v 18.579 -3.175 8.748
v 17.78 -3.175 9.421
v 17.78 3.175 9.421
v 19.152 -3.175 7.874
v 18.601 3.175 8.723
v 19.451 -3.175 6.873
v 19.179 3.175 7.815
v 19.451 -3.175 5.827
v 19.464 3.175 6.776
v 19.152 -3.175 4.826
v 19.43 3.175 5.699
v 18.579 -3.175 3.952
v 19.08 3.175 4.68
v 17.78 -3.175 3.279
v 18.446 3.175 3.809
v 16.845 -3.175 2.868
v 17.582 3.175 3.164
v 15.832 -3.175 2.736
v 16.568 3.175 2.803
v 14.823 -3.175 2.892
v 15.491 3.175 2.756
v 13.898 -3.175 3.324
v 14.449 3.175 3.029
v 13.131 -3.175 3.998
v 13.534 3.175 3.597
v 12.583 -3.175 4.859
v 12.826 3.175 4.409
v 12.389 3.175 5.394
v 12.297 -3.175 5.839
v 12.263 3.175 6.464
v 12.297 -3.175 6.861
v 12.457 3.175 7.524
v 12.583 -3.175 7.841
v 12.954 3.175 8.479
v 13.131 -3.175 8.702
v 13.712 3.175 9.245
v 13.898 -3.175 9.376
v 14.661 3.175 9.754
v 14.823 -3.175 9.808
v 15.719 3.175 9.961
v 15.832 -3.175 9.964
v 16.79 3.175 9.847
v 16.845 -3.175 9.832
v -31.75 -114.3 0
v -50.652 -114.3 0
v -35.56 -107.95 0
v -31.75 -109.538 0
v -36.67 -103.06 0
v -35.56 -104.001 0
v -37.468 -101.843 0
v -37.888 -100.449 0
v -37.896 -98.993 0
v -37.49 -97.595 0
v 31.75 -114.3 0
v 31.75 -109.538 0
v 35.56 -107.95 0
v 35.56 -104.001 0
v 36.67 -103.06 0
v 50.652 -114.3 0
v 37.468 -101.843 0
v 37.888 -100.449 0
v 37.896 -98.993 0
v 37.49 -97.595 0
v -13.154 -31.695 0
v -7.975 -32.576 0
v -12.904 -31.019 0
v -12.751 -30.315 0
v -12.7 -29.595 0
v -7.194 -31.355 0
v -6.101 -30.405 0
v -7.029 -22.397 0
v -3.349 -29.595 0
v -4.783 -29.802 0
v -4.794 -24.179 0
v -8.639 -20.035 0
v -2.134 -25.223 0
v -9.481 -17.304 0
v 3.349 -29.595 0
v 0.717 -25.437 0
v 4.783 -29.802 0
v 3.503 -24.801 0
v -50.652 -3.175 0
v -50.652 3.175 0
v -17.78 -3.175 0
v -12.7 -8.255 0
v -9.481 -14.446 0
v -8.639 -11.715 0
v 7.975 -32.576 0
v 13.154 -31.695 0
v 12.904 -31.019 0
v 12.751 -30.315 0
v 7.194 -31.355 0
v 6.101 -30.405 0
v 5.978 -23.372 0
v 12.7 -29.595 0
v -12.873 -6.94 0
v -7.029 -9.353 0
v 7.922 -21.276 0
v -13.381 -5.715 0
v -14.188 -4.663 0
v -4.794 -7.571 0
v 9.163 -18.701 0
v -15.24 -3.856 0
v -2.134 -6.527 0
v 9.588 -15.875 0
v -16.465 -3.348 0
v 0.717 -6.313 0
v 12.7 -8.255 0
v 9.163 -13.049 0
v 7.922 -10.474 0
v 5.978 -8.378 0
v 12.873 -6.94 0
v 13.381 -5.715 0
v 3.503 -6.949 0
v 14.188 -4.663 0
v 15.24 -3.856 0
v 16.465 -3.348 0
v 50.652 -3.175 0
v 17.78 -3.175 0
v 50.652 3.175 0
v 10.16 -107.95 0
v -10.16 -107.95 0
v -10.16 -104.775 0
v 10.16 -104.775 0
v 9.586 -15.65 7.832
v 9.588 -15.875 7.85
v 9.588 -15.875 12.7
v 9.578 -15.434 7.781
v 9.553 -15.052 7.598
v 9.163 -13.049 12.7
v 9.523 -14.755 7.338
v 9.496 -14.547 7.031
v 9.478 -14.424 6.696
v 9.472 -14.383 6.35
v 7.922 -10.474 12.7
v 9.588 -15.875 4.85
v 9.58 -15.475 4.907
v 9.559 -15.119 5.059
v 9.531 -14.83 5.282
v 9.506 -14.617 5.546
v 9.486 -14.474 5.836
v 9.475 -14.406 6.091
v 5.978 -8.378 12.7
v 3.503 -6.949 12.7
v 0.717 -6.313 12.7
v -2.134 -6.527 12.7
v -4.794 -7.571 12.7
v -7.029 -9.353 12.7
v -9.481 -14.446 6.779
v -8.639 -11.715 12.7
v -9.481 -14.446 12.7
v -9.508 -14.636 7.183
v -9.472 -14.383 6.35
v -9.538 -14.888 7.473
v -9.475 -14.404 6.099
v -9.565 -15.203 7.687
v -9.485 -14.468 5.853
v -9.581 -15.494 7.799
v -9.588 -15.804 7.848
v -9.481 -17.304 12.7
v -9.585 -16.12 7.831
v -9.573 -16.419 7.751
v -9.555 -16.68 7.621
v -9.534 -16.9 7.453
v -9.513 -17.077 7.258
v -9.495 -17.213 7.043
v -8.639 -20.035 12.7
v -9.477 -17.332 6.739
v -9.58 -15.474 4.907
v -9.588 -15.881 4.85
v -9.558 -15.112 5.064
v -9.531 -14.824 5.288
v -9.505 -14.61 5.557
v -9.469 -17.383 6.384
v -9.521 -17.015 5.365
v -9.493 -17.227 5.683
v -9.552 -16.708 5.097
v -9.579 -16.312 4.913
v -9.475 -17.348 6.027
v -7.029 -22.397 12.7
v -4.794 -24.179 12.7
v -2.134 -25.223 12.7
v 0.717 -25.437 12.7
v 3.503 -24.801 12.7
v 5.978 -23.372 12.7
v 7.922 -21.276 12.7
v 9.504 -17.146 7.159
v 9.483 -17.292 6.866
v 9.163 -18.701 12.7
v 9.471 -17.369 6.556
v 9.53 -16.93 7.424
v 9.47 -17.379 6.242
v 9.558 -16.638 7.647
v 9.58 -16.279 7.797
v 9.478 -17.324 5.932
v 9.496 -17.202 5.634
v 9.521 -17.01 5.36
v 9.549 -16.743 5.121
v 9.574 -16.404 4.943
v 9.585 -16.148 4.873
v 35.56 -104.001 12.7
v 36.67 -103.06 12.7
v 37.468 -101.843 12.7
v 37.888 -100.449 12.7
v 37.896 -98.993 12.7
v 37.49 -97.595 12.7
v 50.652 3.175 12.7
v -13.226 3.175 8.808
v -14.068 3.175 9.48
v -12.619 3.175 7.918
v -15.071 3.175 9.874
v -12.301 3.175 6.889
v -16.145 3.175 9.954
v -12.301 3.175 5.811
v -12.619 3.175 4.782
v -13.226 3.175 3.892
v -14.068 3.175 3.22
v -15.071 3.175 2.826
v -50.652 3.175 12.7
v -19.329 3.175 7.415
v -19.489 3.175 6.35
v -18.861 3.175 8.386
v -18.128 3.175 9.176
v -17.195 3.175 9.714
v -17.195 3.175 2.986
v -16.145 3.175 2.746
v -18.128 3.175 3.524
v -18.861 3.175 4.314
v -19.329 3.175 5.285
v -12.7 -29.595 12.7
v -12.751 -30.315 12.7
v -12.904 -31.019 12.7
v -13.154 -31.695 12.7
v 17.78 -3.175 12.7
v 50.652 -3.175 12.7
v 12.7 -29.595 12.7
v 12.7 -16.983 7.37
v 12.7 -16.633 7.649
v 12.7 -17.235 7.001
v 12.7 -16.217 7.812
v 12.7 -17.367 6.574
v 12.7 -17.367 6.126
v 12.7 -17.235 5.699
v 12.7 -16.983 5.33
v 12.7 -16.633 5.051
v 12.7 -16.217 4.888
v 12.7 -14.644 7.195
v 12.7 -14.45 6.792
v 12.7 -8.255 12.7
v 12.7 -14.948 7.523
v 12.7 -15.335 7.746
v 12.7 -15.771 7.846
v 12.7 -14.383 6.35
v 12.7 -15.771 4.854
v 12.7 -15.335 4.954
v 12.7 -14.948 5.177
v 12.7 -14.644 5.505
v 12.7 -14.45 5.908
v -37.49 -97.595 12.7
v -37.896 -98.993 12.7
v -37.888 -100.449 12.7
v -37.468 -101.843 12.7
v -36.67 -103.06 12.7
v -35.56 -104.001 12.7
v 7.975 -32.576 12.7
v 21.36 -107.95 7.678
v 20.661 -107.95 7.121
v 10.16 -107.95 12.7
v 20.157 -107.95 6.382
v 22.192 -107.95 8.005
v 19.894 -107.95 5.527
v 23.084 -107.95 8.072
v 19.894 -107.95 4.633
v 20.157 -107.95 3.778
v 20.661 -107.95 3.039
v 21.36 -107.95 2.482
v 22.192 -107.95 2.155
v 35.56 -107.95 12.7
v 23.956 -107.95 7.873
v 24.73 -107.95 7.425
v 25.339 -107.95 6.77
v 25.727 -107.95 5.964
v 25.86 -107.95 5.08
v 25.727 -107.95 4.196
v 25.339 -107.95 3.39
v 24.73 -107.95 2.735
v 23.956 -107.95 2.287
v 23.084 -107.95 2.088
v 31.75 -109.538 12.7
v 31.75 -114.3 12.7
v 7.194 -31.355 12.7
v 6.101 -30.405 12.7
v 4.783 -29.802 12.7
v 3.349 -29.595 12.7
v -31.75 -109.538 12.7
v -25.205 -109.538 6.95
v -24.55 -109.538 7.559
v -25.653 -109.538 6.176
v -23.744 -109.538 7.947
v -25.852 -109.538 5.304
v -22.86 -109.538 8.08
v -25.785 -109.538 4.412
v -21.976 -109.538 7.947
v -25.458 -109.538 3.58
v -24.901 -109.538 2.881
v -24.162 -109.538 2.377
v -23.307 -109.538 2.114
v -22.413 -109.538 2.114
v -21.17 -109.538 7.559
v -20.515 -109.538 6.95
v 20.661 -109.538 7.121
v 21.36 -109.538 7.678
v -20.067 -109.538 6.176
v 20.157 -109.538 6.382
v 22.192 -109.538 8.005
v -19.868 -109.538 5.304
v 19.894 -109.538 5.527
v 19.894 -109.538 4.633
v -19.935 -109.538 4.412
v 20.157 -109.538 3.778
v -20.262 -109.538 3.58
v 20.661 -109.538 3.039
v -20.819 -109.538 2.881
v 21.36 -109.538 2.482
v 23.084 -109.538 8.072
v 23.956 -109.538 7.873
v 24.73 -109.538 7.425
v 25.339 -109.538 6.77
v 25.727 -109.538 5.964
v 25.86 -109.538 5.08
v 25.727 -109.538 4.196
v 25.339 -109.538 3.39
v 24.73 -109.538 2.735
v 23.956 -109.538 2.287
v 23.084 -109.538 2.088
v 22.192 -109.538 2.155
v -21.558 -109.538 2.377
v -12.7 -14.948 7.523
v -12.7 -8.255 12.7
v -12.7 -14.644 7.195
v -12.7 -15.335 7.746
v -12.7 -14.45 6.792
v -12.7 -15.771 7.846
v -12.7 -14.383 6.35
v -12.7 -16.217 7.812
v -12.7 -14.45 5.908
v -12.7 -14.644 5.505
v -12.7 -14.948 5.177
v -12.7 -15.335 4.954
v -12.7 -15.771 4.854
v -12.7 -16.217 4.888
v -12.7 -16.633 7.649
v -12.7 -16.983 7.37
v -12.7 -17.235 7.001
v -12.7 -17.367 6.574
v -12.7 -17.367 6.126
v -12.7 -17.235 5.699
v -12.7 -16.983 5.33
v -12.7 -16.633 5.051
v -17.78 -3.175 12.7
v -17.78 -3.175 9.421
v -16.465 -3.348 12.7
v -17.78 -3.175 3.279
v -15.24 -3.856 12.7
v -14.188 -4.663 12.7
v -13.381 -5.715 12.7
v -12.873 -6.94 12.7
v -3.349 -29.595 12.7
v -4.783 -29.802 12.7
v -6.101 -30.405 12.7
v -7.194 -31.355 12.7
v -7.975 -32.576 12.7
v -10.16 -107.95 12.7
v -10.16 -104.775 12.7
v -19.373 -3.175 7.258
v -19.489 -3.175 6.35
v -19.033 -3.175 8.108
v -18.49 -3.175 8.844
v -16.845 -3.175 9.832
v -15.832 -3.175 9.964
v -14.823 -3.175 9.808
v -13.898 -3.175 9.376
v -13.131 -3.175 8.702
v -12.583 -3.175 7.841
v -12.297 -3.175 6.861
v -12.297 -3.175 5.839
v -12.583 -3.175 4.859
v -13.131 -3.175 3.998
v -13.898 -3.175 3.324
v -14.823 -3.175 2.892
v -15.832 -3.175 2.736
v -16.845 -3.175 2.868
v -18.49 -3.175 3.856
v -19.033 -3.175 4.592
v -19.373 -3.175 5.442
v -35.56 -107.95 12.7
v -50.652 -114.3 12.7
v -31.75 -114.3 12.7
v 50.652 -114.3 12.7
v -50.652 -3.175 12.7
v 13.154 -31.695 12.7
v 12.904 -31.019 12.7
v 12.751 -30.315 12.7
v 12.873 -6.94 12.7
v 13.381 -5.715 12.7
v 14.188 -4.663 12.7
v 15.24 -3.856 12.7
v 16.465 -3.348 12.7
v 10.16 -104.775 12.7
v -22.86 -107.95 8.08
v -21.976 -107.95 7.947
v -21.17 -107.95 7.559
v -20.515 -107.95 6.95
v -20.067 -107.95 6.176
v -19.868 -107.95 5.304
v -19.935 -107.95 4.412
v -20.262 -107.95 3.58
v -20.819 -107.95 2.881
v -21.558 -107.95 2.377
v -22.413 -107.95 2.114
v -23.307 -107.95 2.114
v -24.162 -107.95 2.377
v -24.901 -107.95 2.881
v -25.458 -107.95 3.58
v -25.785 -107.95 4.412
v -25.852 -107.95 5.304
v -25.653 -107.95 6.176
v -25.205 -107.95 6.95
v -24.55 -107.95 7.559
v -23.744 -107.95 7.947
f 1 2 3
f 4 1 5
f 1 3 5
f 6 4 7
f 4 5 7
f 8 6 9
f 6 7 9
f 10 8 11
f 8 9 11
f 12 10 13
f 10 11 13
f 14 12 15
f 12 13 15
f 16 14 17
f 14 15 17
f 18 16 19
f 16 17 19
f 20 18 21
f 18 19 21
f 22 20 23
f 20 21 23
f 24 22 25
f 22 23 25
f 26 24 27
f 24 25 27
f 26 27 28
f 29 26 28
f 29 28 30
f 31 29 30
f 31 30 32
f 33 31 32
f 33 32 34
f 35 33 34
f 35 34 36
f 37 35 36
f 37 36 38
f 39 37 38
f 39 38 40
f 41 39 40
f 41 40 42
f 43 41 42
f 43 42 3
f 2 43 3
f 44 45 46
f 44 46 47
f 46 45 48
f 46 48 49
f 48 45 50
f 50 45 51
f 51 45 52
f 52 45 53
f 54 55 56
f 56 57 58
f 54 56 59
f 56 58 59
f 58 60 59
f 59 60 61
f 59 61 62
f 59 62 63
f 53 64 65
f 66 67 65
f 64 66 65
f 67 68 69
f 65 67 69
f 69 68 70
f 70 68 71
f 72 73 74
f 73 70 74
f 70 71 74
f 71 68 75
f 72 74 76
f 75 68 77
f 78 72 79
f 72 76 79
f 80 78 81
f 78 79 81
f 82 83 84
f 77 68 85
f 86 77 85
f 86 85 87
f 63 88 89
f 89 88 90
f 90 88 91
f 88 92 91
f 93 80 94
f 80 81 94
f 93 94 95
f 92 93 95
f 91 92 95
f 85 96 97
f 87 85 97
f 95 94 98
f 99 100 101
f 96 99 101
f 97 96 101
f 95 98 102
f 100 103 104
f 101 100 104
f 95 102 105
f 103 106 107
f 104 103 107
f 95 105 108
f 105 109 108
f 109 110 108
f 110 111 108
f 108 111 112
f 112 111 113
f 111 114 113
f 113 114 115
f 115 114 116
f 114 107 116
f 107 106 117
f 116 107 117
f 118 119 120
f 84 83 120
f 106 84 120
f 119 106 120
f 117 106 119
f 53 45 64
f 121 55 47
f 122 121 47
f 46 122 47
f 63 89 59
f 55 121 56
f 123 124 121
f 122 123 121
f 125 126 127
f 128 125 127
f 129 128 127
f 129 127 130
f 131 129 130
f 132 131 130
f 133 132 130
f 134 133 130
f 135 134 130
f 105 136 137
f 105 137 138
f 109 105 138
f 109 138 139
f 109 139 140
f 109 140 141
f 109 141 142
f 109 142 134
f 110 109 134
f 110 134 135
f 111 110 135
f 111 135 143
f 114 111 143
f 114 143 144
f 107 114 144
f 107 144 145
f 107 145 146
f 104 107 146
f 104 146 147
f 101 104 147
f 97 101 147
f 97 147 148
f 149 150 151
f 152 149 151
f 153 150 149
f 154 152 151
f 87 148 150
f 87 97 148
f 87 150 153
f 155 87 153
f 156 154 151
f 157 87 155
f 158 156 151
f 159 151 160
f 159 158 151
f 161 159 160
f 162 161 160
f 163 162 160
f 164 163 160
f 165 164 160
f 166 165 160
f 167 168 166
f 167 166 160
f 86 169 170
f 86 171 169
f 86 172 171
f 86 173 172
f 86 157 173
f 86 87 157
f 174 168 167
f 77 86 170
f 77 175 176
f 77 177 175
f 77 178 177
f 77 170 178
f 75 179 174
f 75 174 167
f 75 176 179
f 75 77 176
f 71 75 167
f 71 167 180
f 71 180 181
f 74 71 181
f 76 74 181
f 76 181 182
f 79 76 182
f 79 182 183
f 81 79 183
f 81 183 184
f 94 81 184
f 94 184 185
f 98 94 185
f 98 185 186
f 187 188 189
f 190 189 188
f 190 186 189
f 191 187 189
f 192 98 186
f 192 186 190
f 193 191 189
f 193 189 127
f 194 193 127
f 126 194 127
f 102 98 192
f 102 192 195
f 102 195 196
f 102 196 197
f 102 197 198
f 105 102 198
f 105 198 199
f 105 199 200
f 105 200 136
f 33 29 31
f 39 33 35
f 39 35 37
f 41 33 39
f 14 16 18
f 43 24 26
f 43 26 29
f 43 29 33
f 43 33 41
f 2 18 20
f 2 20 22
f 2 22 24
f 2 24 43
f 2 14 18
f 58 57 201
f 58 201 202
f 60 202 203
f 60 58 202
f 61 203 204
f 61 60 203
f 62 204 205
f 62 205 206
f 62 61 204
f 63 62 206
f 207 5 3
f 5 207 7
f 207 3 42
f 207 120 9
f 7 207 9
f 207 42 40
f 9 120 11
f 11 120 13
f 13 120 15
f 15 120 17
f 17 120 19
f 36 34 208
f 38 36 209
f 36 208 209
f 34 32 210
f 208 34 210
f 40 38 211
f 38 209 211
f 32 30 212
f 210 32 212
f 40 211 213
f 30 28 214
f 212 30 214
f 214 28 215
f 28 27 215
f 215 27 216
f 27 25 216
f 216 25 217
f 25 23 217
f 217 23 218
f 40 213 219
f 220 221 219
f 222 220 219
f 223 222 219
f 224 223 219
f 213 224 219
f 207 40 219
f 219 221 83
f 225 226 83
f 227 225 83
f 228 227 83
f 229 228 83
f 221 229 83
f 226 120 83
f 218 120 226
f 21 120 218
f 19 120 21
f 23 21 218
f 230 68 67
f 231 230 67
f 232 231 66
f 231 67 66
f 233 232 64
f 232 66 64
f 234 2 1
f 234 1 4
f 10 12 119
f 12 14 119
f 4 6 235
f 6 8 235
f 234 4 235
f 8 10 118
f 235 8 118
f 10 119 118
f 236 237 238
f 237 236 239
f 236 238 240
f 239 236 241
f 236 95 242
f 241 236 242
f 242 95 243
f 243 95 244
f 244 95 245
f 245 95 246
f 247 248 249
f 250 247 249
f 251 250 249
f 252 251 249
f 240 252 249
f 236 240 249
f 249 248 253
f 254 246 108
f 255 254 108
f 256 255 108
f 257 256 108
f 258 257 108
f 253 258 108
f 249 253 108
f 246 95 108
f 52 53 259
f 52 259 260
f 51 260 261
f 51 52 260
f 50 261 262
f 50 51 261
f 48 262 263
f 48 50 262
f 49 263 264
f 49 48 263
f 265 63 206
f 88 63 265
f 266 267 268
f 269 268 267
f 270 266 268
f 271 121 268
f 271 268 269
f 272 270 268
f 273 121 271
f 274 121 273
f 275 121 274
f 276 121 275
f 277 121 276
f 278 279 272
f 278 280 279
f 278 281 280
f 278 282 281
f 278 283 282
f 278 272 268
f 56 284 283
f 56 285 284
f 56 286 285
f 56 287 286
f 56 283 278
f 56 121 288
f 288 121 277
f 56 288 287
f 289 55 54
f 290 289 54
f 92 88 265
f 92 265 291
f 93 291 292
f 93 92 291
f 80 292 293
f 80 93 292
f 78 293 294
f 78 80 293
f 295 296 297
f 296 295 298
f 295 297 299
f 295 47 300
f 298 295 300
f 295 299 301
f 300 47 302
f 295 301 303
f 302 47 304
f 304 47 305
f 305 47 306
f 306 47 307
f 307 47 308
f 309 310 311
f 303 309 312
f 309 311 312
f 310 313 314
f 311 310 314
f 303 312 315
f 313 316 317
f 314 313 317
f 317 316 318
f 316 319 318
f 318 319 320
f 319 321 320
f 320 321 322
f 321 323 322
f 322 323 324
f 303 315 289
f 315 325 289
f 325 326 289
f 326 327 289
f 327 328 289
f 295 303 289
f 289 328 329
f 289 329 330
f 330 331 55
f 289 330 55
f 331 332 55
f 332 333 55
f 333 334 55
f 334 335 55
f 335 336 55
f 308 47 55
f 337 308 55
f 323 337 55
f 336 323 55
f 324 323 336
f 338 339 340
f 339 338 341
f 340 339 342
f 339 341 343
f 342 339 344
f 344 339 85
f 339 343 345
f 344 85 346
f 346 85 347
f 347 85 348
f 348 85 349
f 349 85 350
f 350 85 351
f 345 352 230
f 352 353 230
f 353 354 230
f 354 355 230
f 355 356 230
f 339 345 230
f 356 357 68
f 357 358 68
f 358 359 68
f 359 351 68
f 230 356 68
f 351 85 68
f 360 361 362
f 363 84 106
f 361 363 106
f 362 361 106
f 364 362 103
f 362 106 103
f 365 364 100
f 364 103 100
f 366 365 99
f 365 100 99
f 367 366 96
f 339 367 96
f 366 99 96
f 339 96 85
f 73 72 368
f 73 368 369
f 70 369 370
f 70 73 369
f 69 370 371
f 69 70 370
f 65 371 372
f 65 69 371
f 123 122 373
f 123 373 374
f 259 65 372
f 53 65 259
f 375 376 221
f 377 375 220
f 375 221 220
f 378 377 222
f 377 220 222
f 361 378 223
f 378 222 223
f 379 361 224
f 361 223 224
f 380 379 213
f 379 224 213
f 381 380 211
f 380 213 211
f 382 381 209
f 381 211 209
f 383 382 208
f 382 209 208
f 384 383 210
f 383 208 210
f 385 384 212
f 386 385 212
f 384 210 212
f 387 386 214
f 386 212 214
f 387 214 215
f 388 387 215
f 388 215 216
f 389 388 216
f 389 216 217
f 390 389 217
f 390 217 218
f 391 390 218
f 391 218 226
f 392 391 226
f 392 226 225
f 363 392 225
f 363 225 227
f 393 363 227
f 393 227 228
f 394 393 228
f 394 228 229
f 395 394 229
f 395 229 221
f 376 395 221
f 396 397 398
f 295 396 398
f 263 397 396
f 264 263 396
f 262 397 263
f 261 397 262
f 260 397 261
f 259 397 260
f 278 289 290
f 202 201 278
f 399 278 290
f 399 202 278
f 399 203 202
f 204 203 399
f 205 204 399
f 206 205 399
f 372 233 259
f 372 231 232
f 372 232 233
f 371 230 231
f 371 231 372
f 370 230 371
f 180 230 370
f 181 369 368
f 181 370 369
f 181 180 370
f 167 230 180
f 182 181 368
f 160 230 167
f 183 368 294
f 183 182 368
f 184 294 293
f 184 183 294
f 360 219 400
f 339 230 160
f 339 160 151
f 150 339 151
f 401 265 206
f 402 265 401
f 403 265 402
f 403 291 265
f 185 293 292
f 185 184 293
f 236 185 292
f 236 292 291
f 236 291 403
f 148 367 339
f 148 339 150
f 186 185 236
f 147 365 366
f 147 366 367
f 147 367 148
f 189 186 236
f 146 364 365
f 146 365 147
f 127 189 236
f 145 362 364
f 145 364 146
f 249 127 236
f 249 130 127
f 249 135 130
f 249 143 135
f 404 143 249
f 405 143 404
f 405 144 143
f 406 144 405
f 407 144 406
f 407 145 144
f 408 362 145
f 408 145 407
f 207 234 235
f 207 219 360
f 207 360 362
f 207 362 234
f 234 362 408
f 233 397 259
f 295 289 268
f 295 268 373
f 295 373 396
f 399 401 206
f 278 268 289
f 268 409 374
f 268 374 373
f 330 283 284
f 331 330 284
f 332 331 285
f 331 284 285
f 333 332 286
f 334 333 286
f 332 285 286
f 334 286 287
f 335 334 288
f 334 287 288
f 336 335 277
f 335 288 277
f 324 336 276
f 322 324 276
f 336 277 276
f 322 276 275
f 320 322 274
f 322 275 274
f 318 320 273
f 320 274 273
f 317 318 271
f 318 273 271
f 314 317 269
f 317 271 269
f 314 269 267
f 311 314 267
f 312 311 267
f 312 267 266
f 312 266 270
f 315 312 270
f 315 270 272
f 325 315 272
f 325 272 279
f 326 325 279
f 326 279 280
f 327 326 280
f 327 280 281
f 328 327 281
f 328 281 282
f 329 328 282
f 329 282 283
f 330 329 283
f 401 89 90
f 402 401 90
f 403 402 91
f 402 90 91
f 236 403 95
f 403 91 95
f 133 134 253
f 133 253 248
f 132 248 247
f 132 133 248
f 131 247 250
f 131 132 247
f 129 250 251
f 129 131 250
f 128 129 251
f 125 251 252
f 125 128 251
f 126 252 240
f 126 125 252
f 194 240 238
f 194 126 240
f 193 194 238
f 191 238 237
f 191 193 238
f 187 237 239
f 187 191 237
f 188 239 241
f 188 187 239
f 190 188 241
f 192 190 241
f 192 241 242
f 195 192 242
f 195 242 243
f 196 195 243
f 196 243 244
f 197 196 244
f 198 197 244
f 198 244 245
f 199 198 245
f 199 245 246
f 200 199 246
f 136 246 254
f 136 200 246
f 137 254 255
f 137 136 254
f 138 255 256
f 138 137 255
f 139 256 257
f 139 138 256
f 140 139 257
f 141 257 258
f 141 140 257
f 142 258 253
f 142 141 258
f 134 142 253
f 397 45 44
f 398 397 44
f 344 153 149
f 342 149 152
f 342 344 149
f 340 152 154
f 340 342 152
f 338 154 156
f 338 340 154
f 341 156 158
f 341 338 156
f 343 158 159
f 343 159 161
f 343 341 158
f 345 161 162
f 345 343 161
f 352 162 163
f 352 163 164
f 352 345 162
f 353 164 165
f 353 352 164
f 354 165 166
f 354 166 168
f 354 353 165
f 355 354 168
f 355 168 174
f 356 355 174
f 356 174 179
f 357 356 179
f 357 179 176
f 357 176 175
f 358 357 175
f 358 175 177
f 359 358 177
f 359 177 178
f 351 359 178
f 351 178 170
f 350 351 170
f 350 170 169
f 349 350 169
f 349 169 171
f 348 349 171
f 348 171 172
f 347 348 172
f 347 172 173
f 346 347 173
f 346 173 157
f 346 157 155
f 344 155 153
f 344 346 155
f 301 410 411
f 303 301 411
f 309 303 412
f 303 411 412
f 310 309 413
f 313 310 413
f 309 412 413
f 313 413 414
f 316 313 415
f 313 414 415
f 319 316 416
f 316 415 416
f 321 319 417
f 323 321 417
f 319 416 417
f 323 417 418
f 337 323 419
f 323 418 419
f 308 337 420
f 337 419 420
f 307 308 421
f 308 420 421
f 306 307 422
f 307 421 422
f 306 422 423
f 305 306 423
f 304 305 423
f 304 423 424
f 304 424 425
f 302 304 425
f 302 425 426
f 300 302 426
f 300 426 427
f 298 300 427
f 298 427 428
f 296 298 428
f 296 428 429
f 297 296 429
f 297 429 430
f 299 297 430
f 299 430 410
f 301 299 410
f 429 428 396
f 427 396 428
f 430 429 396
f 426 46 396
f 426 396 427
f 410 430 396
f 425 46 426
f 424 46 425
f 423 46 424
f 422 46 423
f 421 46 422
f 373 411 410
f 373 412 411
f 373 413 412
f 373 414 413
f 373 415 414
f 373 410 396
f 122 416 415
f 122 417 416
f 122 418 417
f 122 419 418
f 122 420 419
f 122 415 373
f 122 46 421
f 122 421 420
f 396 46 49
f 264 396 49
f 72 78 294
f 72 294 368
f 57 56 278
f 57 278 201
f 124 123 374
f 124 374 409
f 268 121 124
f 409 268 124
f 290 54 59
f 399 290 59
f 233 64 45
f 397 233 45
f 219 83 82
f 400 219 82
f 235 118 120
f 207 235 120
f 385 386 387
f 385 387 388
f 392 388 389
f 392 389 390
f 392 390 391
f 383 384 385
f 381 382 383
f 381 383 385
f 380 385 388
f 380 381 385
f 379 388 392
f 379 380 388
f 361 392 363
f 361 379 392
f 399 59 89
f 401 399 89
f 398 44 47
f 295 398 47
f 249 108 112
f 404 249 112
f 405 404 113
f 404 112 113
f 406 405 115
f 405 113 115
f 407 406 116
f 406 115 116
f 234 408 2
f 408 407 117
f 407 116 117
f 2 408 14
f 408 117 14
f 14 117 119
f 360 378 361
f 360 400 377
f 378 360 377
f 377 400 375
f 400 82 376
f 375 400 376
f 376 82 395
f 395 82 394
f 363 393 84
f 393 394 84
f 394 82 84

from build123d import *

# Parameters (mm, degrees)
SKETCH3_R               = 9.5885
BOSS_EXTRUDE1_DEPTH     = 12.7
SKETCH4_R               = 3.614257139
CUT_EXTRUDE1_DEPTH      = 6.35
CUT_EXTRUDE2_START      = -12.7
CUT_EXTRUDE2_OUTLINE_R  = 1.5
CUT_EXTRUDE2_DEPTH      = 25.4
CUT_EXTRUDE3_DEPTH      = 126.664030474
CUT_EXTRUDE3_DEPTH_BACK = 126.664030474
SKETCH8_W               = 25.4
SKETCH8_H               = 5.08
SKETCH9_R               = 3
CUT_EXTRUDE4_DEPTH      = 123.783240632


# Read off the part's stored shape, not the designer's step: Cut-Extrude2
with BuildPart() as part:
    # Sketch3 → Boss-Extrude1 (new body)
    with BuildSketch(Plane.XY):
        with BuildLine():
            Line((50.652428891, 3.175), (-50.652428891, 3.175))
            Line((-50.652428891, 3.175), (-50.652428891, -3.175))
            Line((-50.652428891, -3.175), (-17.78, -3.175))
            ThreePointArc((-17.78, -3.175), (-14.187897552, -4.662897552), (-12.7, -8.255))
            Line((-12.7, -8.255), (-12.7, -29.595434395))
            ThreePointArc((-12.7, -29.595434395), (-12.814872576, -30.66963627), (-13.154295145, -31.69525691))
            Line((-13.154295145, -31.69525691), (-50.652428891, -114.3))
            Line((-50.652428891, -114.3), (-31.75, -114.3))
            Line((-31.75, -114.3), (-31.75, -109.5375))
            Line((-31.75, -109.5375), (31.75, -109.5375))
            Line((31.75, -109.5375), (31.75, -114.3))
            Line((31.75, -114.3), (50.652428891, -114.3))
            Line((50.652428891, -114.3), (13.154295145, -31.69525691))
            ThreePointArc((13.154295145, -31.69525691), (12.814872576, -30.66963627), (12.7, -29.595434395))
            Line((12.7, -29.595434395), (12.7, -8.255))
            ThreePointArc((12.7, -8.255), (14.187897552, -4.662897552), (17.78, -3.175))
            Line((17.78, -3.175), (50.652428891, -3.175))
            Line((50.652428891, -3.175), (50.652428891, 3.175))
        make_face()
        with Locations((0, -15.875)):
            Circle(SKETCH3_R, mode=Mode.SUBTRACT)
        with BuildLine():
            Line((-7.97501727, -32.575611881), (-37.490421301, -97.595177486))
            ThreePointArc((-37.490421301, -97.595177486), (-37.135167146, -102.446299841), (-32.864716446, -104.775))
            Line((-32.864716446, -104.775), (0, -104.775))
            Line((0, -104.775), (32.864716446, -104.775))
            ThreePointArc((32.864716446, -104.775), (37.135167146, -102.446299841), (37.490421301, -97.595177486))
            Line((37.490421301, -97.595177486), (7.97501727, -32.575611881))
            ThreePointArc((7.97501727, -32.575611881), (6.100612256, -30.404983695), (3.349312415, -29.595434395))
            Line((3.349312415, -29.595434395), (-3.349312415, -29.595434395))
            ThreePointArc((-3.349312415, -29.595434395), (-6.100612256, -30.404983695), (-7.97501727, -32.575611881))
        make_face(mode=Mode.SUBTRACT)
    extrude(amount=BOSS_EXTRUDE1_DEPTH)

    # Sketch4 → Cut-Extrude1 (cut)
    with BuildSketch(Plane(origin=(0, 3.175, 0), x_dir=(1, 0, 0), z_dir=(0, 1, 0))):
        with Locations(Location((-15.875, -6.35, 0), (0, 0, 180))):
            Circle(SKETCH4_R)
        with Locations(Location((15.875, -6.35, 0), (0, 0, 301.808324175))):
            Circle(SKETCH4_R)
    extrude(amount=-CUT_EXTRUDE1_DEPTH, mode=Mode.SUBTRACT)

    # Cut-Extrude2 outline → Cut-Extrude2 (cut)
    with BuildSketch(Plane.YZ.offset(CUT_EXTRUDE2_START)):
        with Locations((-15.883331584, 6.35)):
            Circle(CUT_EXTRUDE2_OUTLINE_R)
    extrude(amount=CUT_EXTRUDE2_DEPTH, mode=Mode.SUBTRACT)

    # Sketch8 → Cut-Extrude3 (cut, two sides: drawn at the far end of the back side and taken through both)
    with BuildSketch(Plane.XY.offset(12.7).offset(-CUT_EXTRUDE3_DEPTH_BACK)):
        with Locations((-22.86, -105.41)):
            Rectangle(SKETCH8_W, SKETCH8_H)
        with Locations((22.86, -105.41)):
            Rectangle(SKETCH8_W, SKETCH8_H)
    extrude(amount=CUT_EXTRUDE3_DEPTH + CUT_EXTRUDE3_DEPTH_BACK, mode=Mode.SUBTRACT)

    # Sketch9 → Cut-Extrude4 (cut, through all)
    with BuildSketch(Plane(origin=(0, -107.95, 0), x_dir=(1, 0, 0), z_dir=(0, 1, 0))):
        with Locations(Location((-22.86, -5.08, 0), (0, 0, 270))):
            Circle(SKETCH9_R)
        with Locations((22.86, -5.08)):
            Circle(SKETCH9_R)
    extrude(amount=-CUT_EXTRUDE4_DEPTH, mode=Mode.SUBTRACT)


solid = part.part
